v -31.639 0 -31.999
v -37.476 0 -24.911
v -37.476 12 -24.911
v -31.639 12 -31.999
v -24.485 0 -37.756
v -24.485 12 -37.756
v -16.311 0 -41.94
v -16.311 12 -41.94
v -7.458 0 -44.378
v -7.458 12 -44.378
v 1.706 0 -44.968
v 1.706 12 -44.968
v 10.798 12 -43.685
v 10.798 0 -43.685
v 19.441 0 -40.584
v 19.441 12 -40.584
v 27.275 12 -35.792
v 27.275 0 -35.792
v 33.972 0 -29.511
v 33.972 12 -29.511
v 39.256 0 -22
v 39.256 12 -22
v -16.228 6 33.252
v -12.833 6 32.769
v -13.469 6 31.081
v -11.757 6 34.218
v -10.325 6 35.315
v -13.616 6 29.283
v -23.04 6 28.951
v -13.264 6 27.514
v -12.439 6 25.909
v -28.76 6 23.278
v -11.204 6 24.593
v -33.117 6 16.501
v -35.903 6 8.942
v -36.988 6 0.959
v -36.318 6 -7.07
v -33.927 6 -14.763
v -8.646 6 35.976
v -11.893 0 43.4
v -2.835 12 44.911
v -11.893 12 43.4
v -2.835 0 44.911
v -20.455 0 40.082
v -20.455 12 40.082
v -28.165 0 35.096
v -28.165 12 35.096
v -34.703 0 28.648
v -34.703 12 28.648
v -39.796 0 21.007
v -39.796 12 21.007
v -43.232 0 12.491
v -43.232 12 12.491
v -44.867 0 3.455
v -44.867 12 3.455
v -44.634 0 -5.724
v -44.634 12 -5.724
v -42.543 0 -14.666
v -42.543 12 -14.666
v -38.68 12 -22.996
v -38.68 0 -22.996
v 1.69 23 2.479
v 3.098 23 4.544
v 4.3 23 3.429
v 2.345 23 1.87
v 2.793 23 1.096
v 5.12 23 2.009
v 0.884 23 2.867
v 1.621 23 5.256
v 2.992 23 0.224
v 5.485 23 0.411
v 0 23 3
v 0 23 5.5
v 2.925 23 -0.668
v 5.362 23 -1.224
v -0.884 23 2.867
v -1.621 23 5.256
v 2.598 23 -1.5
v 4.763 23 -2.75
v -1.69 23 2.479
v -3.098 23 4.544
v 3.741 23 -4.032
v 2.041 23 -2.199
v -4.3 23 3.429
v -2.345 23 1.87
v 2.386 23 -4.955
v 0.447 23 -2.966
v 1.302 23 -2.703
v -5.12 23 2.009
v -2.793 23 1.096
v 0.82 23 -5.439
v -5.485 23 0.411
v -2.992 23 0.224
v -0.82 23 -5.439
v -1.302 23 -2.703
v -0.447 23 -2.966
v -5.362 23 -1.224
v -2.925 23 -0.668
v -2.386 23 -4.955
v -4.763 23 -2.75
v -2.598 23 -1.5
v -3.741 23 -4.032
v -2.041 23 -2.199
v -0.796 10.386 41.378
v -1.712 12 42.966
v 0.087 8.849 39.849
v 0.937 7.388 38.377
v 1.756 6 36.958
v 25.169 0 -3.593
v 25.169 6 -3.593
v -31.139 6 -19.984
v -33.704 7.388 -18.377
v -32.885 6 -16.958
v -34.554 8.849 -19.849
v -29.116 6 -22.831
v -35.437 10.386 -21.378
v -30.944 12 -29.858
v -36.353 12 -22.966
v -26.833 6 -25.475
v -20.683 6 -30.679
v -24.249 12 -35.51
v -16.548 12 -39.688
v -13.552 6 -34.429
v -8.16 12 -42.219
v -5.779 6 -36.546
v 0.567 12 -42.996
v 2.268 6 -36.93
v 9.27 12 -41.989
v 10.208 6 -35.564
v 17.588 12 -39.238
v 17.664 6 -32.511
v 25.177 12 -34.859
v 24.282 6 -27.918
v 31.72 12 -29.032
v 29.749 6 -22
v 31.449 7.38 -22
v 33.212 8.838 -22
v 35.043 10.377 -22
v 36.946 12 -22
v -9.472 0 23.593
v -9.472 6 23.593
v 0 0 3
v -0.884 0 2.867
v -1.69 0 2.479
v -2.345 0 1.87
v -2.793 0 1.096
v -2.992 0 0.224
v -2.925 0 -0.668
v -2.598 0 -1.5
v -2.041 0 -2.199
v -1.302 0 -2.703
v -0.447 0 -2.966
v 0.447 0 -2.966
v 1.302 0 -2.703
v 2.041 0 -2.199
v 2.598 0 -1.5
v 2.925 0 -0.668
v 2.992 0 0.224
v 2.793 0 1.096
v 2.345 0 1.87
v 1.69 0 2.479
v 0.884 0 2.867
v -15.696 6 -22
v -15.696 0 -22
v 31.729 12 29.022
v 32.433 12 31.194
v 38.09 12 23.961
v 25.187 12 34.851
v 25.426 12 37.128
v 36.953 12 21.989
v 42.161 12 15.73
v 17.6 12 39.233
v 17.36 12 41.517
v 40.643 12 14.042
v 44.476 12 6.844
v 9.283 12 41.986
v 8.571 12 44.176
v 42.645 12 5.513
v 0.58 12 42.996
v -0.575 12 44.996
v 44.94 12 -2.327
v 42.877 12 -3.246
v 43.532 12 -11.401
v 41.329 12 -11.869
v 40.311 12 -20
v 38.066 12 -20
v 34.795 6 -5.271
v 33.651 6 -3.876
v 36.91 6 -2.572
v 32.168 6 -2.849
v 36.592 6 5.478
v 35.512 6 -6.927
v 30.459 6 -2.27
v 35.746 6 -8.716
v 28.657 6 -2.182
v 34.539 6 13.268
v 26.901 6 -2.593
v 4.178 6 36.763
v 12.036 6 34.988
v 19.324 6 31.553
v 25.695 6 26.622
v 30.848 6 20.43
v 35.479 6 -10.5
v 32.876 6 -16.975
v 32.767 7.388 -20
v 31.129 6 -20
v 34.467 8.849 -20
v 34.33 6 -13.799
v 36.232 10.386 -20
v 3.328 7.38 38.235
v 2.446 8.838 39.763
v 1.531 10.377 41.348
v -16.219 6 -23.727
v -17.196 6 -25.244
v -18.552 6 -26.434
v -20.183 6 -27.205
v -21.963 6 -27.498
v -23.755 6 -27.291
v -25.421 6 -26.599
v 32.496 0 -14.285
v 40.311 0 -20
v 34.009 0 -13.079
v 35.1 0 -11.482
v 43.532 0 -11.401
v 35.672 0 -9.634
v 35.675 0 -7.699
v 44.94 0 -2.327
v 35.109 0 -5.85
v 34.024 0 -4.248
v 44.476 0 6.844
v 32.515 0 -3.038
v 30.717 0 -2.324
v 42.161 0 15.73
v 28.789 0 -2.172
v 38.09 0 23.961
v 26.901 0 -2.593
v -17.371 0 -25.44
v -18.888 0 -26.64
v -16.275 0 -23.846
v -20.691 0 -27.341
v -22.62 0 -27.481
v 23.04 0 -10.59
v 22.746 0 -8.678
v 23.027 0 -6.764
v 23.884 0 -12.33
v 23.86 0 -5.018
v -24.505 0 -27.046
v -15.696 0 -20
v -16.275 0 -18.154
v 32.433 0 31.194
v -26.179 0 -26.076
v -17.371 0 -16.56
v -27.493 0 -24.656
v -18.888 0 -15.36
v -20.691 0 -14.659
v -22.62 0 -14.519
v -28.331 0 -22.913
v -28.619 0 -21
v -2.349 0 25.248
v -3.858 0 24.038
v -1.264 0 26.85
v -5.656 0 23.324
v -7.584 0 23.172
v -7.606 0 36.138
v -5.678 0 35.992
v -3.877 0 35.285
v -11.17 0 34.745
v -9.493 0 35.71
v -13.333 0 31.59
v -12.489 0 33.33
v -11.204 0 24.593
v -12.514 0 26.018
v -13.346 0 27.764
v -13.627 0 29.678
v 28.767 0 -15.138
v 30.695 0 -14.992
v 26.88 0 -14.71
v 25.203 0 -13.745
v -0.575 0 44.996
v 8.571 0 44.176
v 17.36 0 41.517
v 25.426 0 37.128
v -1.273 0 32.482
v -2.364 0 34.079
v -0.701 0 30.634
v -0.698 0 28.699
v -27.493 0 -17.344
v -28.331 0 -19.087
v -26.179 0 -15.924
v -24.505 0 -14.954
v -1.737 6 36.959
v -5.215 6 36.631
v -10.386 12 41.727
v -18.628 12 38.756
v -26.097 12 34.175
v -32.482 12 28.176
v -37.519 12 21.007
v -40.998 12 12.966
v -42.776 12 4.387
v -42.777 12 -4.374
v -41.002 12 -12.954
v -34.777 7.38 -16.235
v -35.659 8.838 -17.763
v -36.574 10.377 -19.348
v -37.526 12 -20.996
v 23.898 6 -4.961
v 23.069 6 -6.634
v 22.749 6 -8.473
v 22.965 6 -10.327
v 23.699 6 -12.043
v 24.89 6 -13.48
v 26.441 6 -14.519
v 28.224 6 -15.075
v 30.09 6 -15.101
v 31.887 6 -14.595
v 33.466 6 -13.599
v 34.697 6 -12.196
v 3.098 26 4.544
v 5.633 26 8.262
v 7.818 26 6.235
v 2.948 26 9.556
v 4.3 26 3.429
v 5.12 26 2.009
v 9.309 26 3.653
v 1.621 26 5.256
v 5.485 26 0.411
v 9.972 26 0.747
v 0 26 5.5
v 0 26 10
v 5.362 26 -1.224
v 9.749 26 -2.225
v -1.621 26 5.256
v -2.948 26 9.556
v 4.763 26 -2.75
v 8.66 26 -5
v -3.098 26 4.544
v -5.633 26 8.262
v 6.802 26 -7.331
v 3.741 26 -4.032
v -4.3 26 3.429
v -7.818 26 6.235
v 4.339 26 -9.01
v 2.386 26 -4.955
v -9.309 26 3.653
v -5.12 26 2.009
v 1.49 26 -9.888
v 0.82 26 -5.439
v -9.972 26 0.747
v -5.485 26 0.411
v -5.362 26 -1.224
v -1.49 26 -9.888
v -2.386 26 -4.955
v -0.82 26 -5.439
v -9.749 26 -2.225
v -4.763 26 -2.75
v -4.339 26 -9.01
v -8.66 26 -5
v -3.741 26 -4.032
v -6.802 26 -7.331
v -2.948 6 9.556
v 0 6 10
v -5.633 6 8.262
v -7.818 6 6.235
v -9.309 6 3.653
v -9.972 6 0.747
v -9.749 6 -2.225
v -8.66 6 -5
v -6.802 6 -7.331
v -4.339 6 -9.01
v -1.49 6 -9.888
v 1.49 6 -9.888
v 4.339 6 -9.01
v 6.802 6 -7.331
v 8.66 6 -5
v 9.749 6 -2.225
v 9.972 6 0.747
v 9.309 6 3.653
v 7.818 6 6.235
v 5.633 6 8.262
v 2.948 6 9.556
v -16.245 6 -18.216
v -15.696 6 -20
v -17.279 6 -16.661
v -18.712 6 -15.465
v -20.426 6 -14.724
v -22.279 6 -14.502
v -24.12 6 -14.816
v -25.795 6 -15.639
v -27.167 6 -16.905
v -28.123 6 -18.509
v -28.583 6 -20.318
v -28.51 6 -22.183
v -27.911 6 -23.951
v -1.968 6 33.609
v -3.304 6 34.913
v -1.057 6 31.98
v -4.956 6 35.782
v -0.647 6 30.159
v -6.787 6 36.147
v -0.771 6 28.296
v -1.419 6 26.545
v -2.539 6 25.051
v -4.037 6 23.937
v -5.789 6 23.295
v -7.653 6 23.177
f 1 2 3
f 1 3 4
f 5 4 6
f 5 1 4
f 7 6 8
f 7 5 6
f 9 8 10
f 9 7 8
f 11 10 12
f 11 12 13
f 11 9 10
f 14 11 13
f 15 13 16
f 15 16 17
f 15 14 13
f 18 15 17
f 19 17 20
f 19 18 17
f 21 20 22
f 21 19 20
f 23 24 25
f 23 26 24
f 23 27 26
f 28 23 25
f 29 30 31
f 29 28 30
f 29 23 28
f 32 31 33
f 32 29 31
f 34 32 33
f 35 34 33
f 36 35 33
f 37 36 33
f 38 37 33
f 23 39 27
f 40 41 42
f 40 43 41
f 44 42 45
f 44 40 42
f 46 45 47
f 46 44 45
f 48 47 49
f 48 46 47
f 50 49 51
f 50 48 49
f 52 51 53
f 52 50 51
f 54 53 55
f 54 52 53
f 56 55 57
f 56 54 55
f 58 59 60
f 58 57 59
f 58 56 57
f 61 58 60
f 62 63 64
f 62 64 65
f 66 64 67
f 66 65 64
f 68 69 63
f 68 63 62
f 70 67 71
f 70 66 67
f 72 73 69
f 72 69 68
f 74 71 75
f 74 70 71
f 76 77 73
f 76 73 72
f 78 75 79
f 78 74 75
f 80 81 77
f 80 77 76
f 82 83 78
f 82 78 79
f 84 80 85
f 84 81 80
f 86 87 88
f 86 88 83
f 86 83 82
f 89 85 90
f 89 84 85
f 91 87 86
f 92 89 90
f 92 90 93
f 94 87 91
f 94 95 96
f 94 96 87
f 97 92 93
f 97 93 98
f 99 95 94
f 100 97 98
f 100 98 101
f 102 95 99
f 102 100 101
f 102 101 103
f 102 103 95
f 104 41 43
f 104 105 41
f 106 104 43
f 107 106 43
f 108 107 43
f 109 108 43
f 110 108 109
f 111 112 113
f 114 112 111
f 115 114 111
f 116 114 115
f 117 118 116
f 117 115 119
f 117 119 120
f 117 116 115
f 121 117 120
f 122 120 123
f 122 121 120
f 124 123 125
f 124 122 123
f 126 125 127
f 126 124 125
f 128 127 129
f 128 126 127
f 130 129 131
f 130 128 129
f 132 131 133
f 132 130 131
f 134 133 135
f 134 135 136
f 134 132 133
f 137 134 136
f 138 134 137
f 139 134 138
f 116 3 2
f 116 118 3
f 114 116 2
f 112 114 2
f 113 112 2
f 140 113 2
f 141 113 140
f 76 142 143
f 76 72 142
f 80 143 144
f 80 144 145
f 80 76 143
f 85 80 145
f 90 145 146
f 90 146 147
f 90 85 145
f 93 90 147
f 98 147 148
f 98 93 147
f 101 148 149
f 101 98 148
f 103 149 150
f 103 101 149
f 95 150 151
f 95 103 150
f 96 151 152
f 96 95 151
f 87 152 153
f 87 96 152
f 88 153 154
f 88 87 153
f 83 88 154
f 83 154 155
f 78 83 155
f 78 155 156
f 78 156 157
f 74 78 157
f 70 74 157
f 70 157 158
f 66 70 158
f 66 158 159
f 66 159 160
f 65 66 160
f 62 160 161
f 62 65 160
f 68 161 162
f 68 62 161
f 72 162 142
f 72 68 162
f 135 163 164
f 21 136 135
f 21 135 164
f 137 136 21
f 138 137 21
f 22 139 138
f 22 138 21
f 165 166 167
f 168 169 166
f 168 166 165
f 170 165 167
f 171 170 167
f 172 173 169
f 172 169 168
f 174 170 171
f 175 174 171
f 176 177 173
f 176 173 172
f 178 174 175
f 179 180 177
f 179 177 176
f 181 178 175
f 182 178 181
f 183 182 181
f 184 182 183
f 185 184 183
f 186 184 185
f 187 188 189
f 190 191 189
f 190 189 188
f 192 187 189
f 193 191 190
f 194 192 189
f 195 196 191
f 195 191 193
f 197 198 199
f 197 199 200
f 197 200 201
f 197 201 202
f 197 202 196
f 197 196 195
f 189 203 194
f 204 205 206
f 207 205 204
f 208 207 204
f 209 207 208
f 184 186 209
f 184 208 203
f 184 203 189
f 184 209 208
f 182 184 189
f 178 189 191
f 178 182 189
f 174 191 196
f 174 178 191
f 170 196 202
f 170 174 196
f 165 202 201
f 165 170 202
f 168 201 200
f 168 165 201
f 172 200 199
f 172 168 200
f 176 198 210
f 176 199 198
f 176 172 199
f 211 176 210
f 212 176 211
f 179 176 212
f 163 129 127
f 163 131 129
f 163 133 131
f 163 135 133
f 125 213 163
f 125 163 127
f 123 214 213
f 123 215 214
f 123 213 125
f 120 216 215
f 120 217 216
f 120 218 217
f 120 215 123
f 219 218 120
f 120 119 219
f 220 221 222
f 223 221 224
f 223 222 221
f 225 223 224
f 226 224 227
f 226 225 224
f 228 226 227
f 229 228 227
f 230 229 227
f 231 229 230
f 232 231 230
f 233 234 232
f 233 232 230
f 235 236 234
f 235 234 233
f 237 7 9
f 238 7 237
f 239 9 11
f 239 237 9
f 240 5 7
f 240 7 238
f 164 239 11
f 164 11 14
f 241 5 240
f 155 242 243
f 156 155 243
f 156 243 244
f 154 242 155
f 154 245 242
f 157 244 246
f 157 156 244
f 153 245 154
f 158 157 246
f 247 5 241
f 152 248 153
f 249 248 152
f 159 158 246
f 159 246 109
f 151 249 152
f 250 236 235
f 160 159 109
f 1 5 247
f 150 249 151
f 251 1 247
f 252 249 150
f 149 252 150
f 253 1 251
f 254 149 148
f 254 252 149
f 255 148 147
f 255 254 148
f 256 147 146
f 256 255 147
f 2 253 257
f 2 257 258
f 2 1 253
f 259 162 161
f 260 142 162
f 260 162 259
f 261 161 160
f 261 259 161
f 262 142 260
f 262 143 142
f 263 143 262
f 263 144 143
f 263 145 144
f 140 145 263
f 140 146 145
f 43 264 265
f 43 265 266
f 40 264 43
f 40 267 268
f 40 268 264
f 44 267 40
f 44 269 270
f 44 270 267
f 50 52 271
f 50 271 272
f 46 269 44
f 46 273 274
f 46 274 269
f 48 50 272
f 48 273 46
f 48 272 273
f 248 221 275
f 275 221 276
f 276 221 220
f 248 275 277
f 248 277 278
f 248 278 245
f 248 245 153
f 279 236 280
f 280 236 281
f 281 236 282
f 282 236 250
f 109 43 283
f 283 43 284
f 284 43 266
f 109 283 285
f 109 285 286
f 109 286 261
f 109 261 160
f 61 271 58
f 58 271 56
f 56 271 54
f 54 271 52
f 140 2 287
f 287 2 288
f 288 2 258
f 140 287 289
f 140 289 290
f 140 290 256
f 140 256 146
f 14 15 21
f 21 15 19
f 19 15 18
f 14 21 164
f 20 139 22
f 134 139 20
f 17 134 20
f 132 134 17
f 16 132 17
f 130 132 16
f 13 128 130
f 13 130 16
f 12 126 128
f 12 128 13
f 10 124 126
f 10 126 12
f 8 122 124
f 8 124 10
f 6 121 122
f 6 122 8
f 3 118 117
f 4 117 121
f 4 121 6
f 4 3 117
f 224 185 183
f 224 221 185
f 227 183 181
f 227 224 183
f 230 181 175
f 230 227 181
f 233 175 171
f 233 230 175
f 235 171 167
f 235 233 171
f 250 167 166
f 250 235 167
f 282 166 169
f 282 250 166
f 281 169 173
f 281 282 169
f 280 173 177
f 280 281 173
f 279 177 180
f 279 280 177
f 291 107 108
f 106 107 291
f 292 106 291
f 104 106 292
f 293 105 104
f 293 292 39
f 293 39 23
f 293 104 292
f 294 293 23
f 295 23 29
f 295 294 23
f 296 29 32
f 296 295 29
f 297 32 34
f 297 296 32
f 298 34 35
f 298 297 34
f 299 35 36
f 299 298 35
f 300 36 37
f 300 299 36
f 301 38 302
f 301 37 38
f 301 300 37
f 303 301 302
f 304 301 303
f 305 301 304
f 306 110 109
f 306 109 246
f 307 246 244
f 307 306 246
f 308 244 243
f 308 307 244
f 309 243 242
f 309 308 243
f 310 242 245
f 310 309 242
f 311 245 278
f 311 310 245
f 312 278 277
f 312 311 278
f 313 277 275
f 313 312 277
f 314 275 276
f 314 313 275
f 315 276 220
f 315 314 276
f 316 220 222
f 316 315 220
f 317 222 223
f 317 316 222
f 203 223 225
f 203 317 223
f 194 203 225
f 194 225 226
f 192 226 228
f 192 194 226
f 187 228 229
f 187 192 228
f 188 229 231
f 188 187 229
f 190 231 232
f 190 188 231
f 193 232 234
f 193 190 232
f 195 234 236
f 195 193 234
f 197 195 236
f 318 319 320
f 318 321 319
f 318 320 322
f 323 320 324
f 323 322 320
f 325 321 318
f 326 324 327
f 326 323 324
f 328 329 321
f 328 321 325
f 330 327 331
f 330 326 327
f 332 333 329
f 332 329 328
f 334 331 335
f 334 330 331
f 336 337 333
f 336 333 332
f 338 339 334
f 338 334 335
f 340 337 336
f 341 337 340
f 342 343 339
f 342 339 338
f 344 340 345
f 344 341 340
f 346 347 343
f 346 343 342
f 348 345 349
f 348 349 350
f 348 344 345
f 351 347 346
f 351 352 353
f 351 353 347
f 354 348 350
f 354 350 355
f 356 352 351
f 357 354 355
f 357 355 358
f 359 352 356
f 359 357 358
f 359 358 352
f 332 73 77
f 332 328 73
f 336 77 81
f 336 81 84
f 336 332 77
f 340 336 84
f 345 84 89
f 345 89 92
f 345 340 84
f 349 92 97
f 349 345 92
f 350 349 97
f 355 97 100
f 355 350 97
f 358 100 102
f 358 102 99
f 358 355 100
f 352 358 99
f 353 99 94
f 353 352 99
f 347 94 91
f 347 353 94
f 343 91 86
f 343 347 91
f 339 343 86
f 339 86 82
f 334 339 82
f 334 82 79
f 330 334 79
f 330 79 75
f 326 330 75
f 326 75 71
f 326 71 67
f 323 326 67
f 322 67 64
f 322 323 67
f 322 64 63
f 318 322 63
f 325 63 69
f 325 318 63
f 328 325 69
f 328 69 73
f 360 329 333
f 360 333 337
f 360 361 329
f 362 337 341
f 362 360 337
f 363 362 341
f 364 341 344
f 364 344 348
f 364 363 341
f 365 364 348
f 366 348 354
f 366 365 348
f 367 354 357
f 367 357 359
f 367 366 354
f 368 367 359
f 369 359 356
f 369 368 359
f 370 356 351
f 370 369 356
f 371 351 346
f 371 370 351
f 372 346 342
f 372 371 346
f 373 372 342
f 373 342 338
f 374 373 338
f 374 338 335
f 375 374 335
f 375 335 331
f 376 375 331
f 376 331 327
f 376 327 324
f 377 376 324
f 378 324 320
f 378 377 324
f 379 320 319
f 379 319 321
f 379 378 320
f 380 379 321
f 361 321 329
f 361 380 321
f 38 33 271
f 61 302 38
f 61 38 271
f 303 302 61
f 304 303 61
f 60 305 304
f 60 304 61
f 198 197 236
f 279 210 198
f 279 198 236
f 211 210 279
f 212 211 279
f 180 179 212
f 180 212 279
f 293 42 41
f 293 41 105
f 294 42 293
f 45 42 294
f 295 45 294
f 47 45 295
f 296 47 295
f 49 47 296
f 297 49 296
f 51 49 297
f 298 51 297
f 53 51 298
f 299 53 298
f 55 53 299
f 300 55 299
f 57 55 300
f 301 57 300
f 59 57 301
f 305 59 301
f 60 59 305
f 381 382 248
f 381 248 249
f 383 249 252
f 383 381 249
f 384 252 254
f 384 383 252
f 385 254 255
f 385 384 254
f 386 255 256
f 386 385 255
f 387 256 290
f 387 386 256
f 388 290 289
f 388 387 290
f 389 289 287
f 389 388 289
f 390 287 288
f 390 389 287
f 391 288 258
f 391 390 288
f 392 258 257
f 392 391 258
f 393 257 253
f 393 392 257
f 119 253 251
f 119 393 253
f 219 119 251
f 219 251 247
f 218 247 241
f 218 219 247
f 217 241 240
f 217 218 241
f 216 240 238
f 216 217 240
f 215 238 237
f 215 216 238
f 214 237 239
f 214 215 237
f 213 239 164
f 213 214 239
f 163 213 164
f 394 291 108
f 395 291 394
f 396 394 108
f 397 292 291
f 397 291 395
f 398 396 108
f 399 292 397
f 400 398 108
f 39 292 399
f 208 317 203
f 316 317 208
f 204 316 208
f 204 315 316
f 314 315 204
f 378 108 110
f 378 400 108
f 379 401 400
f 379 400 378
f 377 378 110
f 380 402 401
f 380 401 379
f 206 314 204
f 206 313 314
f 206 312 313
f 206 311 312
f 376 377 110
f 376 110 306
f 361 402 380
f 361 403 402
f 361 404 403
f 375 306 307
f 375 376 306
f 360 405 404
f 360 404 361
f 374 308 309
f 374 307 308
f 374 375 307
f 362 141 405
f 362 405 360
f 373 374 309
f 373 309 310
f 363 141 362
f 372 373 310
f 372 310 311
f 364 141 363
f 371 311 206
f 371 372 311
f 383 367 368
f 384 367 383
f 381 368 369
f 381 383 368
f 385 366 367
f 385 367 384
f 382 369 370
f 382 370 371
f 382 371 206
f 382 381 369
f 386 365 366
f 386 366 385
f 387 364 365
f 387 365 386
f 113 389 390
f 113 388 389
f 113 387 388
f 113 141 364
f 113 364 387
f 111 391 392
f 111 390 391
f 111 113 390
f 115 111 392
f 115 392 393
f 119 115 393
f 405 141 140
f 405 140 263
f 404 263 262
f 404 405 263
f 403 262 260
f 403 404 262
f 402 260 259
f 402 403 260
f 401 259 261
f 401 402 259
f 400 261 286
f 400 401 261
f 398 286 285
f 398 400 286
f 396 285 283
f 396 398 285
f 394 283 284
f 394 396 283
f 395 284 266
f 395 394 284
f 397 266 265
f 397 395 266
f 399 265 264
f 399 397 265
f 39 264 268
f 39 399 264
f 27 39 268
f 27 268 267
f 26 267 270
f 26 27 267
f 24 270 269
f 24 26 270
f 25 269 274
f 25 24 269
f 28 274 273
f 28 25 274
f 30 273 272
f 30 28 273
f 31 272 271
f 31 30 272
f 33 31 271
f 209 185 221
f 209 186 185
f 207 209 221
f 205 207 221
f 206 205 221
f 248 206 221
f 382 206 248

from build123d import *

# Parameters (mm, degrees)
CUT_EXTRUDE_1_DEPTH      = 67.708320321
PATTERN_CIRCULAR_1_COUNT = 3


with BuildPart() as part:
    # 草图1 → 旋转1 (revolve)
    with BuildSketch(Plane.XY, mode=Mode.PRIVATE) as revolve_1_sk:
        Polygon((10, 26), (10, 6), (37, 6), (43, 12), (45, 12), (45, 0), (3, 0), (3, 23), (5.5, 23), (5.5, 26), align=None)
    revolve(revolve_1_sk.sketch.rotate(Axis((0, 83.728815318, 0), (0, -1, 0)), 90), axis=Axis((0, 83.728815318, 0), (0, -1, 0)))

    # 草图2 → 切除-拉伸1 (cut, symmetric)
    with BuildSketch(Plane(origin=(0, 6, 0), x_dir=(1, 0, 0), z_dir=(0, 1, 0))):
        with BuildLine():
            Line((-15.696380071, 22), (39.255572853, 22))
            ThreePointArc((39.255572853, 22), (39.795996859, 21.006633096), (40.311288741, 20))
            Line((40.311288741, 20), (-15.696380071, 20))
            ThreePointArc((-15.696380071, 20), (-28.618996361, 21), (-15.696380071, 22))
        make_face()
    cut_extrude_1 = extrude(amount=CUT_EXTRUDE_1_DEPTH, both=True, mode=Mode.SUBTRACT)

    # 阵列(圆周)1: 切除-拉伸1 ×3 about axis
    pattern_circular_1_axis = Axis((0, 0, 0), (0, 1, 0))
    for i in range(1, PATTERN_CIRCULAR_1_COUNT):
        add(cut_extrude_1.rotate(pattern_circular_1_axis, i * 360 / PATTERN_CIRCULAR_1_COUNT), mode=Mode.SUBTRACT)


solid = part.part
